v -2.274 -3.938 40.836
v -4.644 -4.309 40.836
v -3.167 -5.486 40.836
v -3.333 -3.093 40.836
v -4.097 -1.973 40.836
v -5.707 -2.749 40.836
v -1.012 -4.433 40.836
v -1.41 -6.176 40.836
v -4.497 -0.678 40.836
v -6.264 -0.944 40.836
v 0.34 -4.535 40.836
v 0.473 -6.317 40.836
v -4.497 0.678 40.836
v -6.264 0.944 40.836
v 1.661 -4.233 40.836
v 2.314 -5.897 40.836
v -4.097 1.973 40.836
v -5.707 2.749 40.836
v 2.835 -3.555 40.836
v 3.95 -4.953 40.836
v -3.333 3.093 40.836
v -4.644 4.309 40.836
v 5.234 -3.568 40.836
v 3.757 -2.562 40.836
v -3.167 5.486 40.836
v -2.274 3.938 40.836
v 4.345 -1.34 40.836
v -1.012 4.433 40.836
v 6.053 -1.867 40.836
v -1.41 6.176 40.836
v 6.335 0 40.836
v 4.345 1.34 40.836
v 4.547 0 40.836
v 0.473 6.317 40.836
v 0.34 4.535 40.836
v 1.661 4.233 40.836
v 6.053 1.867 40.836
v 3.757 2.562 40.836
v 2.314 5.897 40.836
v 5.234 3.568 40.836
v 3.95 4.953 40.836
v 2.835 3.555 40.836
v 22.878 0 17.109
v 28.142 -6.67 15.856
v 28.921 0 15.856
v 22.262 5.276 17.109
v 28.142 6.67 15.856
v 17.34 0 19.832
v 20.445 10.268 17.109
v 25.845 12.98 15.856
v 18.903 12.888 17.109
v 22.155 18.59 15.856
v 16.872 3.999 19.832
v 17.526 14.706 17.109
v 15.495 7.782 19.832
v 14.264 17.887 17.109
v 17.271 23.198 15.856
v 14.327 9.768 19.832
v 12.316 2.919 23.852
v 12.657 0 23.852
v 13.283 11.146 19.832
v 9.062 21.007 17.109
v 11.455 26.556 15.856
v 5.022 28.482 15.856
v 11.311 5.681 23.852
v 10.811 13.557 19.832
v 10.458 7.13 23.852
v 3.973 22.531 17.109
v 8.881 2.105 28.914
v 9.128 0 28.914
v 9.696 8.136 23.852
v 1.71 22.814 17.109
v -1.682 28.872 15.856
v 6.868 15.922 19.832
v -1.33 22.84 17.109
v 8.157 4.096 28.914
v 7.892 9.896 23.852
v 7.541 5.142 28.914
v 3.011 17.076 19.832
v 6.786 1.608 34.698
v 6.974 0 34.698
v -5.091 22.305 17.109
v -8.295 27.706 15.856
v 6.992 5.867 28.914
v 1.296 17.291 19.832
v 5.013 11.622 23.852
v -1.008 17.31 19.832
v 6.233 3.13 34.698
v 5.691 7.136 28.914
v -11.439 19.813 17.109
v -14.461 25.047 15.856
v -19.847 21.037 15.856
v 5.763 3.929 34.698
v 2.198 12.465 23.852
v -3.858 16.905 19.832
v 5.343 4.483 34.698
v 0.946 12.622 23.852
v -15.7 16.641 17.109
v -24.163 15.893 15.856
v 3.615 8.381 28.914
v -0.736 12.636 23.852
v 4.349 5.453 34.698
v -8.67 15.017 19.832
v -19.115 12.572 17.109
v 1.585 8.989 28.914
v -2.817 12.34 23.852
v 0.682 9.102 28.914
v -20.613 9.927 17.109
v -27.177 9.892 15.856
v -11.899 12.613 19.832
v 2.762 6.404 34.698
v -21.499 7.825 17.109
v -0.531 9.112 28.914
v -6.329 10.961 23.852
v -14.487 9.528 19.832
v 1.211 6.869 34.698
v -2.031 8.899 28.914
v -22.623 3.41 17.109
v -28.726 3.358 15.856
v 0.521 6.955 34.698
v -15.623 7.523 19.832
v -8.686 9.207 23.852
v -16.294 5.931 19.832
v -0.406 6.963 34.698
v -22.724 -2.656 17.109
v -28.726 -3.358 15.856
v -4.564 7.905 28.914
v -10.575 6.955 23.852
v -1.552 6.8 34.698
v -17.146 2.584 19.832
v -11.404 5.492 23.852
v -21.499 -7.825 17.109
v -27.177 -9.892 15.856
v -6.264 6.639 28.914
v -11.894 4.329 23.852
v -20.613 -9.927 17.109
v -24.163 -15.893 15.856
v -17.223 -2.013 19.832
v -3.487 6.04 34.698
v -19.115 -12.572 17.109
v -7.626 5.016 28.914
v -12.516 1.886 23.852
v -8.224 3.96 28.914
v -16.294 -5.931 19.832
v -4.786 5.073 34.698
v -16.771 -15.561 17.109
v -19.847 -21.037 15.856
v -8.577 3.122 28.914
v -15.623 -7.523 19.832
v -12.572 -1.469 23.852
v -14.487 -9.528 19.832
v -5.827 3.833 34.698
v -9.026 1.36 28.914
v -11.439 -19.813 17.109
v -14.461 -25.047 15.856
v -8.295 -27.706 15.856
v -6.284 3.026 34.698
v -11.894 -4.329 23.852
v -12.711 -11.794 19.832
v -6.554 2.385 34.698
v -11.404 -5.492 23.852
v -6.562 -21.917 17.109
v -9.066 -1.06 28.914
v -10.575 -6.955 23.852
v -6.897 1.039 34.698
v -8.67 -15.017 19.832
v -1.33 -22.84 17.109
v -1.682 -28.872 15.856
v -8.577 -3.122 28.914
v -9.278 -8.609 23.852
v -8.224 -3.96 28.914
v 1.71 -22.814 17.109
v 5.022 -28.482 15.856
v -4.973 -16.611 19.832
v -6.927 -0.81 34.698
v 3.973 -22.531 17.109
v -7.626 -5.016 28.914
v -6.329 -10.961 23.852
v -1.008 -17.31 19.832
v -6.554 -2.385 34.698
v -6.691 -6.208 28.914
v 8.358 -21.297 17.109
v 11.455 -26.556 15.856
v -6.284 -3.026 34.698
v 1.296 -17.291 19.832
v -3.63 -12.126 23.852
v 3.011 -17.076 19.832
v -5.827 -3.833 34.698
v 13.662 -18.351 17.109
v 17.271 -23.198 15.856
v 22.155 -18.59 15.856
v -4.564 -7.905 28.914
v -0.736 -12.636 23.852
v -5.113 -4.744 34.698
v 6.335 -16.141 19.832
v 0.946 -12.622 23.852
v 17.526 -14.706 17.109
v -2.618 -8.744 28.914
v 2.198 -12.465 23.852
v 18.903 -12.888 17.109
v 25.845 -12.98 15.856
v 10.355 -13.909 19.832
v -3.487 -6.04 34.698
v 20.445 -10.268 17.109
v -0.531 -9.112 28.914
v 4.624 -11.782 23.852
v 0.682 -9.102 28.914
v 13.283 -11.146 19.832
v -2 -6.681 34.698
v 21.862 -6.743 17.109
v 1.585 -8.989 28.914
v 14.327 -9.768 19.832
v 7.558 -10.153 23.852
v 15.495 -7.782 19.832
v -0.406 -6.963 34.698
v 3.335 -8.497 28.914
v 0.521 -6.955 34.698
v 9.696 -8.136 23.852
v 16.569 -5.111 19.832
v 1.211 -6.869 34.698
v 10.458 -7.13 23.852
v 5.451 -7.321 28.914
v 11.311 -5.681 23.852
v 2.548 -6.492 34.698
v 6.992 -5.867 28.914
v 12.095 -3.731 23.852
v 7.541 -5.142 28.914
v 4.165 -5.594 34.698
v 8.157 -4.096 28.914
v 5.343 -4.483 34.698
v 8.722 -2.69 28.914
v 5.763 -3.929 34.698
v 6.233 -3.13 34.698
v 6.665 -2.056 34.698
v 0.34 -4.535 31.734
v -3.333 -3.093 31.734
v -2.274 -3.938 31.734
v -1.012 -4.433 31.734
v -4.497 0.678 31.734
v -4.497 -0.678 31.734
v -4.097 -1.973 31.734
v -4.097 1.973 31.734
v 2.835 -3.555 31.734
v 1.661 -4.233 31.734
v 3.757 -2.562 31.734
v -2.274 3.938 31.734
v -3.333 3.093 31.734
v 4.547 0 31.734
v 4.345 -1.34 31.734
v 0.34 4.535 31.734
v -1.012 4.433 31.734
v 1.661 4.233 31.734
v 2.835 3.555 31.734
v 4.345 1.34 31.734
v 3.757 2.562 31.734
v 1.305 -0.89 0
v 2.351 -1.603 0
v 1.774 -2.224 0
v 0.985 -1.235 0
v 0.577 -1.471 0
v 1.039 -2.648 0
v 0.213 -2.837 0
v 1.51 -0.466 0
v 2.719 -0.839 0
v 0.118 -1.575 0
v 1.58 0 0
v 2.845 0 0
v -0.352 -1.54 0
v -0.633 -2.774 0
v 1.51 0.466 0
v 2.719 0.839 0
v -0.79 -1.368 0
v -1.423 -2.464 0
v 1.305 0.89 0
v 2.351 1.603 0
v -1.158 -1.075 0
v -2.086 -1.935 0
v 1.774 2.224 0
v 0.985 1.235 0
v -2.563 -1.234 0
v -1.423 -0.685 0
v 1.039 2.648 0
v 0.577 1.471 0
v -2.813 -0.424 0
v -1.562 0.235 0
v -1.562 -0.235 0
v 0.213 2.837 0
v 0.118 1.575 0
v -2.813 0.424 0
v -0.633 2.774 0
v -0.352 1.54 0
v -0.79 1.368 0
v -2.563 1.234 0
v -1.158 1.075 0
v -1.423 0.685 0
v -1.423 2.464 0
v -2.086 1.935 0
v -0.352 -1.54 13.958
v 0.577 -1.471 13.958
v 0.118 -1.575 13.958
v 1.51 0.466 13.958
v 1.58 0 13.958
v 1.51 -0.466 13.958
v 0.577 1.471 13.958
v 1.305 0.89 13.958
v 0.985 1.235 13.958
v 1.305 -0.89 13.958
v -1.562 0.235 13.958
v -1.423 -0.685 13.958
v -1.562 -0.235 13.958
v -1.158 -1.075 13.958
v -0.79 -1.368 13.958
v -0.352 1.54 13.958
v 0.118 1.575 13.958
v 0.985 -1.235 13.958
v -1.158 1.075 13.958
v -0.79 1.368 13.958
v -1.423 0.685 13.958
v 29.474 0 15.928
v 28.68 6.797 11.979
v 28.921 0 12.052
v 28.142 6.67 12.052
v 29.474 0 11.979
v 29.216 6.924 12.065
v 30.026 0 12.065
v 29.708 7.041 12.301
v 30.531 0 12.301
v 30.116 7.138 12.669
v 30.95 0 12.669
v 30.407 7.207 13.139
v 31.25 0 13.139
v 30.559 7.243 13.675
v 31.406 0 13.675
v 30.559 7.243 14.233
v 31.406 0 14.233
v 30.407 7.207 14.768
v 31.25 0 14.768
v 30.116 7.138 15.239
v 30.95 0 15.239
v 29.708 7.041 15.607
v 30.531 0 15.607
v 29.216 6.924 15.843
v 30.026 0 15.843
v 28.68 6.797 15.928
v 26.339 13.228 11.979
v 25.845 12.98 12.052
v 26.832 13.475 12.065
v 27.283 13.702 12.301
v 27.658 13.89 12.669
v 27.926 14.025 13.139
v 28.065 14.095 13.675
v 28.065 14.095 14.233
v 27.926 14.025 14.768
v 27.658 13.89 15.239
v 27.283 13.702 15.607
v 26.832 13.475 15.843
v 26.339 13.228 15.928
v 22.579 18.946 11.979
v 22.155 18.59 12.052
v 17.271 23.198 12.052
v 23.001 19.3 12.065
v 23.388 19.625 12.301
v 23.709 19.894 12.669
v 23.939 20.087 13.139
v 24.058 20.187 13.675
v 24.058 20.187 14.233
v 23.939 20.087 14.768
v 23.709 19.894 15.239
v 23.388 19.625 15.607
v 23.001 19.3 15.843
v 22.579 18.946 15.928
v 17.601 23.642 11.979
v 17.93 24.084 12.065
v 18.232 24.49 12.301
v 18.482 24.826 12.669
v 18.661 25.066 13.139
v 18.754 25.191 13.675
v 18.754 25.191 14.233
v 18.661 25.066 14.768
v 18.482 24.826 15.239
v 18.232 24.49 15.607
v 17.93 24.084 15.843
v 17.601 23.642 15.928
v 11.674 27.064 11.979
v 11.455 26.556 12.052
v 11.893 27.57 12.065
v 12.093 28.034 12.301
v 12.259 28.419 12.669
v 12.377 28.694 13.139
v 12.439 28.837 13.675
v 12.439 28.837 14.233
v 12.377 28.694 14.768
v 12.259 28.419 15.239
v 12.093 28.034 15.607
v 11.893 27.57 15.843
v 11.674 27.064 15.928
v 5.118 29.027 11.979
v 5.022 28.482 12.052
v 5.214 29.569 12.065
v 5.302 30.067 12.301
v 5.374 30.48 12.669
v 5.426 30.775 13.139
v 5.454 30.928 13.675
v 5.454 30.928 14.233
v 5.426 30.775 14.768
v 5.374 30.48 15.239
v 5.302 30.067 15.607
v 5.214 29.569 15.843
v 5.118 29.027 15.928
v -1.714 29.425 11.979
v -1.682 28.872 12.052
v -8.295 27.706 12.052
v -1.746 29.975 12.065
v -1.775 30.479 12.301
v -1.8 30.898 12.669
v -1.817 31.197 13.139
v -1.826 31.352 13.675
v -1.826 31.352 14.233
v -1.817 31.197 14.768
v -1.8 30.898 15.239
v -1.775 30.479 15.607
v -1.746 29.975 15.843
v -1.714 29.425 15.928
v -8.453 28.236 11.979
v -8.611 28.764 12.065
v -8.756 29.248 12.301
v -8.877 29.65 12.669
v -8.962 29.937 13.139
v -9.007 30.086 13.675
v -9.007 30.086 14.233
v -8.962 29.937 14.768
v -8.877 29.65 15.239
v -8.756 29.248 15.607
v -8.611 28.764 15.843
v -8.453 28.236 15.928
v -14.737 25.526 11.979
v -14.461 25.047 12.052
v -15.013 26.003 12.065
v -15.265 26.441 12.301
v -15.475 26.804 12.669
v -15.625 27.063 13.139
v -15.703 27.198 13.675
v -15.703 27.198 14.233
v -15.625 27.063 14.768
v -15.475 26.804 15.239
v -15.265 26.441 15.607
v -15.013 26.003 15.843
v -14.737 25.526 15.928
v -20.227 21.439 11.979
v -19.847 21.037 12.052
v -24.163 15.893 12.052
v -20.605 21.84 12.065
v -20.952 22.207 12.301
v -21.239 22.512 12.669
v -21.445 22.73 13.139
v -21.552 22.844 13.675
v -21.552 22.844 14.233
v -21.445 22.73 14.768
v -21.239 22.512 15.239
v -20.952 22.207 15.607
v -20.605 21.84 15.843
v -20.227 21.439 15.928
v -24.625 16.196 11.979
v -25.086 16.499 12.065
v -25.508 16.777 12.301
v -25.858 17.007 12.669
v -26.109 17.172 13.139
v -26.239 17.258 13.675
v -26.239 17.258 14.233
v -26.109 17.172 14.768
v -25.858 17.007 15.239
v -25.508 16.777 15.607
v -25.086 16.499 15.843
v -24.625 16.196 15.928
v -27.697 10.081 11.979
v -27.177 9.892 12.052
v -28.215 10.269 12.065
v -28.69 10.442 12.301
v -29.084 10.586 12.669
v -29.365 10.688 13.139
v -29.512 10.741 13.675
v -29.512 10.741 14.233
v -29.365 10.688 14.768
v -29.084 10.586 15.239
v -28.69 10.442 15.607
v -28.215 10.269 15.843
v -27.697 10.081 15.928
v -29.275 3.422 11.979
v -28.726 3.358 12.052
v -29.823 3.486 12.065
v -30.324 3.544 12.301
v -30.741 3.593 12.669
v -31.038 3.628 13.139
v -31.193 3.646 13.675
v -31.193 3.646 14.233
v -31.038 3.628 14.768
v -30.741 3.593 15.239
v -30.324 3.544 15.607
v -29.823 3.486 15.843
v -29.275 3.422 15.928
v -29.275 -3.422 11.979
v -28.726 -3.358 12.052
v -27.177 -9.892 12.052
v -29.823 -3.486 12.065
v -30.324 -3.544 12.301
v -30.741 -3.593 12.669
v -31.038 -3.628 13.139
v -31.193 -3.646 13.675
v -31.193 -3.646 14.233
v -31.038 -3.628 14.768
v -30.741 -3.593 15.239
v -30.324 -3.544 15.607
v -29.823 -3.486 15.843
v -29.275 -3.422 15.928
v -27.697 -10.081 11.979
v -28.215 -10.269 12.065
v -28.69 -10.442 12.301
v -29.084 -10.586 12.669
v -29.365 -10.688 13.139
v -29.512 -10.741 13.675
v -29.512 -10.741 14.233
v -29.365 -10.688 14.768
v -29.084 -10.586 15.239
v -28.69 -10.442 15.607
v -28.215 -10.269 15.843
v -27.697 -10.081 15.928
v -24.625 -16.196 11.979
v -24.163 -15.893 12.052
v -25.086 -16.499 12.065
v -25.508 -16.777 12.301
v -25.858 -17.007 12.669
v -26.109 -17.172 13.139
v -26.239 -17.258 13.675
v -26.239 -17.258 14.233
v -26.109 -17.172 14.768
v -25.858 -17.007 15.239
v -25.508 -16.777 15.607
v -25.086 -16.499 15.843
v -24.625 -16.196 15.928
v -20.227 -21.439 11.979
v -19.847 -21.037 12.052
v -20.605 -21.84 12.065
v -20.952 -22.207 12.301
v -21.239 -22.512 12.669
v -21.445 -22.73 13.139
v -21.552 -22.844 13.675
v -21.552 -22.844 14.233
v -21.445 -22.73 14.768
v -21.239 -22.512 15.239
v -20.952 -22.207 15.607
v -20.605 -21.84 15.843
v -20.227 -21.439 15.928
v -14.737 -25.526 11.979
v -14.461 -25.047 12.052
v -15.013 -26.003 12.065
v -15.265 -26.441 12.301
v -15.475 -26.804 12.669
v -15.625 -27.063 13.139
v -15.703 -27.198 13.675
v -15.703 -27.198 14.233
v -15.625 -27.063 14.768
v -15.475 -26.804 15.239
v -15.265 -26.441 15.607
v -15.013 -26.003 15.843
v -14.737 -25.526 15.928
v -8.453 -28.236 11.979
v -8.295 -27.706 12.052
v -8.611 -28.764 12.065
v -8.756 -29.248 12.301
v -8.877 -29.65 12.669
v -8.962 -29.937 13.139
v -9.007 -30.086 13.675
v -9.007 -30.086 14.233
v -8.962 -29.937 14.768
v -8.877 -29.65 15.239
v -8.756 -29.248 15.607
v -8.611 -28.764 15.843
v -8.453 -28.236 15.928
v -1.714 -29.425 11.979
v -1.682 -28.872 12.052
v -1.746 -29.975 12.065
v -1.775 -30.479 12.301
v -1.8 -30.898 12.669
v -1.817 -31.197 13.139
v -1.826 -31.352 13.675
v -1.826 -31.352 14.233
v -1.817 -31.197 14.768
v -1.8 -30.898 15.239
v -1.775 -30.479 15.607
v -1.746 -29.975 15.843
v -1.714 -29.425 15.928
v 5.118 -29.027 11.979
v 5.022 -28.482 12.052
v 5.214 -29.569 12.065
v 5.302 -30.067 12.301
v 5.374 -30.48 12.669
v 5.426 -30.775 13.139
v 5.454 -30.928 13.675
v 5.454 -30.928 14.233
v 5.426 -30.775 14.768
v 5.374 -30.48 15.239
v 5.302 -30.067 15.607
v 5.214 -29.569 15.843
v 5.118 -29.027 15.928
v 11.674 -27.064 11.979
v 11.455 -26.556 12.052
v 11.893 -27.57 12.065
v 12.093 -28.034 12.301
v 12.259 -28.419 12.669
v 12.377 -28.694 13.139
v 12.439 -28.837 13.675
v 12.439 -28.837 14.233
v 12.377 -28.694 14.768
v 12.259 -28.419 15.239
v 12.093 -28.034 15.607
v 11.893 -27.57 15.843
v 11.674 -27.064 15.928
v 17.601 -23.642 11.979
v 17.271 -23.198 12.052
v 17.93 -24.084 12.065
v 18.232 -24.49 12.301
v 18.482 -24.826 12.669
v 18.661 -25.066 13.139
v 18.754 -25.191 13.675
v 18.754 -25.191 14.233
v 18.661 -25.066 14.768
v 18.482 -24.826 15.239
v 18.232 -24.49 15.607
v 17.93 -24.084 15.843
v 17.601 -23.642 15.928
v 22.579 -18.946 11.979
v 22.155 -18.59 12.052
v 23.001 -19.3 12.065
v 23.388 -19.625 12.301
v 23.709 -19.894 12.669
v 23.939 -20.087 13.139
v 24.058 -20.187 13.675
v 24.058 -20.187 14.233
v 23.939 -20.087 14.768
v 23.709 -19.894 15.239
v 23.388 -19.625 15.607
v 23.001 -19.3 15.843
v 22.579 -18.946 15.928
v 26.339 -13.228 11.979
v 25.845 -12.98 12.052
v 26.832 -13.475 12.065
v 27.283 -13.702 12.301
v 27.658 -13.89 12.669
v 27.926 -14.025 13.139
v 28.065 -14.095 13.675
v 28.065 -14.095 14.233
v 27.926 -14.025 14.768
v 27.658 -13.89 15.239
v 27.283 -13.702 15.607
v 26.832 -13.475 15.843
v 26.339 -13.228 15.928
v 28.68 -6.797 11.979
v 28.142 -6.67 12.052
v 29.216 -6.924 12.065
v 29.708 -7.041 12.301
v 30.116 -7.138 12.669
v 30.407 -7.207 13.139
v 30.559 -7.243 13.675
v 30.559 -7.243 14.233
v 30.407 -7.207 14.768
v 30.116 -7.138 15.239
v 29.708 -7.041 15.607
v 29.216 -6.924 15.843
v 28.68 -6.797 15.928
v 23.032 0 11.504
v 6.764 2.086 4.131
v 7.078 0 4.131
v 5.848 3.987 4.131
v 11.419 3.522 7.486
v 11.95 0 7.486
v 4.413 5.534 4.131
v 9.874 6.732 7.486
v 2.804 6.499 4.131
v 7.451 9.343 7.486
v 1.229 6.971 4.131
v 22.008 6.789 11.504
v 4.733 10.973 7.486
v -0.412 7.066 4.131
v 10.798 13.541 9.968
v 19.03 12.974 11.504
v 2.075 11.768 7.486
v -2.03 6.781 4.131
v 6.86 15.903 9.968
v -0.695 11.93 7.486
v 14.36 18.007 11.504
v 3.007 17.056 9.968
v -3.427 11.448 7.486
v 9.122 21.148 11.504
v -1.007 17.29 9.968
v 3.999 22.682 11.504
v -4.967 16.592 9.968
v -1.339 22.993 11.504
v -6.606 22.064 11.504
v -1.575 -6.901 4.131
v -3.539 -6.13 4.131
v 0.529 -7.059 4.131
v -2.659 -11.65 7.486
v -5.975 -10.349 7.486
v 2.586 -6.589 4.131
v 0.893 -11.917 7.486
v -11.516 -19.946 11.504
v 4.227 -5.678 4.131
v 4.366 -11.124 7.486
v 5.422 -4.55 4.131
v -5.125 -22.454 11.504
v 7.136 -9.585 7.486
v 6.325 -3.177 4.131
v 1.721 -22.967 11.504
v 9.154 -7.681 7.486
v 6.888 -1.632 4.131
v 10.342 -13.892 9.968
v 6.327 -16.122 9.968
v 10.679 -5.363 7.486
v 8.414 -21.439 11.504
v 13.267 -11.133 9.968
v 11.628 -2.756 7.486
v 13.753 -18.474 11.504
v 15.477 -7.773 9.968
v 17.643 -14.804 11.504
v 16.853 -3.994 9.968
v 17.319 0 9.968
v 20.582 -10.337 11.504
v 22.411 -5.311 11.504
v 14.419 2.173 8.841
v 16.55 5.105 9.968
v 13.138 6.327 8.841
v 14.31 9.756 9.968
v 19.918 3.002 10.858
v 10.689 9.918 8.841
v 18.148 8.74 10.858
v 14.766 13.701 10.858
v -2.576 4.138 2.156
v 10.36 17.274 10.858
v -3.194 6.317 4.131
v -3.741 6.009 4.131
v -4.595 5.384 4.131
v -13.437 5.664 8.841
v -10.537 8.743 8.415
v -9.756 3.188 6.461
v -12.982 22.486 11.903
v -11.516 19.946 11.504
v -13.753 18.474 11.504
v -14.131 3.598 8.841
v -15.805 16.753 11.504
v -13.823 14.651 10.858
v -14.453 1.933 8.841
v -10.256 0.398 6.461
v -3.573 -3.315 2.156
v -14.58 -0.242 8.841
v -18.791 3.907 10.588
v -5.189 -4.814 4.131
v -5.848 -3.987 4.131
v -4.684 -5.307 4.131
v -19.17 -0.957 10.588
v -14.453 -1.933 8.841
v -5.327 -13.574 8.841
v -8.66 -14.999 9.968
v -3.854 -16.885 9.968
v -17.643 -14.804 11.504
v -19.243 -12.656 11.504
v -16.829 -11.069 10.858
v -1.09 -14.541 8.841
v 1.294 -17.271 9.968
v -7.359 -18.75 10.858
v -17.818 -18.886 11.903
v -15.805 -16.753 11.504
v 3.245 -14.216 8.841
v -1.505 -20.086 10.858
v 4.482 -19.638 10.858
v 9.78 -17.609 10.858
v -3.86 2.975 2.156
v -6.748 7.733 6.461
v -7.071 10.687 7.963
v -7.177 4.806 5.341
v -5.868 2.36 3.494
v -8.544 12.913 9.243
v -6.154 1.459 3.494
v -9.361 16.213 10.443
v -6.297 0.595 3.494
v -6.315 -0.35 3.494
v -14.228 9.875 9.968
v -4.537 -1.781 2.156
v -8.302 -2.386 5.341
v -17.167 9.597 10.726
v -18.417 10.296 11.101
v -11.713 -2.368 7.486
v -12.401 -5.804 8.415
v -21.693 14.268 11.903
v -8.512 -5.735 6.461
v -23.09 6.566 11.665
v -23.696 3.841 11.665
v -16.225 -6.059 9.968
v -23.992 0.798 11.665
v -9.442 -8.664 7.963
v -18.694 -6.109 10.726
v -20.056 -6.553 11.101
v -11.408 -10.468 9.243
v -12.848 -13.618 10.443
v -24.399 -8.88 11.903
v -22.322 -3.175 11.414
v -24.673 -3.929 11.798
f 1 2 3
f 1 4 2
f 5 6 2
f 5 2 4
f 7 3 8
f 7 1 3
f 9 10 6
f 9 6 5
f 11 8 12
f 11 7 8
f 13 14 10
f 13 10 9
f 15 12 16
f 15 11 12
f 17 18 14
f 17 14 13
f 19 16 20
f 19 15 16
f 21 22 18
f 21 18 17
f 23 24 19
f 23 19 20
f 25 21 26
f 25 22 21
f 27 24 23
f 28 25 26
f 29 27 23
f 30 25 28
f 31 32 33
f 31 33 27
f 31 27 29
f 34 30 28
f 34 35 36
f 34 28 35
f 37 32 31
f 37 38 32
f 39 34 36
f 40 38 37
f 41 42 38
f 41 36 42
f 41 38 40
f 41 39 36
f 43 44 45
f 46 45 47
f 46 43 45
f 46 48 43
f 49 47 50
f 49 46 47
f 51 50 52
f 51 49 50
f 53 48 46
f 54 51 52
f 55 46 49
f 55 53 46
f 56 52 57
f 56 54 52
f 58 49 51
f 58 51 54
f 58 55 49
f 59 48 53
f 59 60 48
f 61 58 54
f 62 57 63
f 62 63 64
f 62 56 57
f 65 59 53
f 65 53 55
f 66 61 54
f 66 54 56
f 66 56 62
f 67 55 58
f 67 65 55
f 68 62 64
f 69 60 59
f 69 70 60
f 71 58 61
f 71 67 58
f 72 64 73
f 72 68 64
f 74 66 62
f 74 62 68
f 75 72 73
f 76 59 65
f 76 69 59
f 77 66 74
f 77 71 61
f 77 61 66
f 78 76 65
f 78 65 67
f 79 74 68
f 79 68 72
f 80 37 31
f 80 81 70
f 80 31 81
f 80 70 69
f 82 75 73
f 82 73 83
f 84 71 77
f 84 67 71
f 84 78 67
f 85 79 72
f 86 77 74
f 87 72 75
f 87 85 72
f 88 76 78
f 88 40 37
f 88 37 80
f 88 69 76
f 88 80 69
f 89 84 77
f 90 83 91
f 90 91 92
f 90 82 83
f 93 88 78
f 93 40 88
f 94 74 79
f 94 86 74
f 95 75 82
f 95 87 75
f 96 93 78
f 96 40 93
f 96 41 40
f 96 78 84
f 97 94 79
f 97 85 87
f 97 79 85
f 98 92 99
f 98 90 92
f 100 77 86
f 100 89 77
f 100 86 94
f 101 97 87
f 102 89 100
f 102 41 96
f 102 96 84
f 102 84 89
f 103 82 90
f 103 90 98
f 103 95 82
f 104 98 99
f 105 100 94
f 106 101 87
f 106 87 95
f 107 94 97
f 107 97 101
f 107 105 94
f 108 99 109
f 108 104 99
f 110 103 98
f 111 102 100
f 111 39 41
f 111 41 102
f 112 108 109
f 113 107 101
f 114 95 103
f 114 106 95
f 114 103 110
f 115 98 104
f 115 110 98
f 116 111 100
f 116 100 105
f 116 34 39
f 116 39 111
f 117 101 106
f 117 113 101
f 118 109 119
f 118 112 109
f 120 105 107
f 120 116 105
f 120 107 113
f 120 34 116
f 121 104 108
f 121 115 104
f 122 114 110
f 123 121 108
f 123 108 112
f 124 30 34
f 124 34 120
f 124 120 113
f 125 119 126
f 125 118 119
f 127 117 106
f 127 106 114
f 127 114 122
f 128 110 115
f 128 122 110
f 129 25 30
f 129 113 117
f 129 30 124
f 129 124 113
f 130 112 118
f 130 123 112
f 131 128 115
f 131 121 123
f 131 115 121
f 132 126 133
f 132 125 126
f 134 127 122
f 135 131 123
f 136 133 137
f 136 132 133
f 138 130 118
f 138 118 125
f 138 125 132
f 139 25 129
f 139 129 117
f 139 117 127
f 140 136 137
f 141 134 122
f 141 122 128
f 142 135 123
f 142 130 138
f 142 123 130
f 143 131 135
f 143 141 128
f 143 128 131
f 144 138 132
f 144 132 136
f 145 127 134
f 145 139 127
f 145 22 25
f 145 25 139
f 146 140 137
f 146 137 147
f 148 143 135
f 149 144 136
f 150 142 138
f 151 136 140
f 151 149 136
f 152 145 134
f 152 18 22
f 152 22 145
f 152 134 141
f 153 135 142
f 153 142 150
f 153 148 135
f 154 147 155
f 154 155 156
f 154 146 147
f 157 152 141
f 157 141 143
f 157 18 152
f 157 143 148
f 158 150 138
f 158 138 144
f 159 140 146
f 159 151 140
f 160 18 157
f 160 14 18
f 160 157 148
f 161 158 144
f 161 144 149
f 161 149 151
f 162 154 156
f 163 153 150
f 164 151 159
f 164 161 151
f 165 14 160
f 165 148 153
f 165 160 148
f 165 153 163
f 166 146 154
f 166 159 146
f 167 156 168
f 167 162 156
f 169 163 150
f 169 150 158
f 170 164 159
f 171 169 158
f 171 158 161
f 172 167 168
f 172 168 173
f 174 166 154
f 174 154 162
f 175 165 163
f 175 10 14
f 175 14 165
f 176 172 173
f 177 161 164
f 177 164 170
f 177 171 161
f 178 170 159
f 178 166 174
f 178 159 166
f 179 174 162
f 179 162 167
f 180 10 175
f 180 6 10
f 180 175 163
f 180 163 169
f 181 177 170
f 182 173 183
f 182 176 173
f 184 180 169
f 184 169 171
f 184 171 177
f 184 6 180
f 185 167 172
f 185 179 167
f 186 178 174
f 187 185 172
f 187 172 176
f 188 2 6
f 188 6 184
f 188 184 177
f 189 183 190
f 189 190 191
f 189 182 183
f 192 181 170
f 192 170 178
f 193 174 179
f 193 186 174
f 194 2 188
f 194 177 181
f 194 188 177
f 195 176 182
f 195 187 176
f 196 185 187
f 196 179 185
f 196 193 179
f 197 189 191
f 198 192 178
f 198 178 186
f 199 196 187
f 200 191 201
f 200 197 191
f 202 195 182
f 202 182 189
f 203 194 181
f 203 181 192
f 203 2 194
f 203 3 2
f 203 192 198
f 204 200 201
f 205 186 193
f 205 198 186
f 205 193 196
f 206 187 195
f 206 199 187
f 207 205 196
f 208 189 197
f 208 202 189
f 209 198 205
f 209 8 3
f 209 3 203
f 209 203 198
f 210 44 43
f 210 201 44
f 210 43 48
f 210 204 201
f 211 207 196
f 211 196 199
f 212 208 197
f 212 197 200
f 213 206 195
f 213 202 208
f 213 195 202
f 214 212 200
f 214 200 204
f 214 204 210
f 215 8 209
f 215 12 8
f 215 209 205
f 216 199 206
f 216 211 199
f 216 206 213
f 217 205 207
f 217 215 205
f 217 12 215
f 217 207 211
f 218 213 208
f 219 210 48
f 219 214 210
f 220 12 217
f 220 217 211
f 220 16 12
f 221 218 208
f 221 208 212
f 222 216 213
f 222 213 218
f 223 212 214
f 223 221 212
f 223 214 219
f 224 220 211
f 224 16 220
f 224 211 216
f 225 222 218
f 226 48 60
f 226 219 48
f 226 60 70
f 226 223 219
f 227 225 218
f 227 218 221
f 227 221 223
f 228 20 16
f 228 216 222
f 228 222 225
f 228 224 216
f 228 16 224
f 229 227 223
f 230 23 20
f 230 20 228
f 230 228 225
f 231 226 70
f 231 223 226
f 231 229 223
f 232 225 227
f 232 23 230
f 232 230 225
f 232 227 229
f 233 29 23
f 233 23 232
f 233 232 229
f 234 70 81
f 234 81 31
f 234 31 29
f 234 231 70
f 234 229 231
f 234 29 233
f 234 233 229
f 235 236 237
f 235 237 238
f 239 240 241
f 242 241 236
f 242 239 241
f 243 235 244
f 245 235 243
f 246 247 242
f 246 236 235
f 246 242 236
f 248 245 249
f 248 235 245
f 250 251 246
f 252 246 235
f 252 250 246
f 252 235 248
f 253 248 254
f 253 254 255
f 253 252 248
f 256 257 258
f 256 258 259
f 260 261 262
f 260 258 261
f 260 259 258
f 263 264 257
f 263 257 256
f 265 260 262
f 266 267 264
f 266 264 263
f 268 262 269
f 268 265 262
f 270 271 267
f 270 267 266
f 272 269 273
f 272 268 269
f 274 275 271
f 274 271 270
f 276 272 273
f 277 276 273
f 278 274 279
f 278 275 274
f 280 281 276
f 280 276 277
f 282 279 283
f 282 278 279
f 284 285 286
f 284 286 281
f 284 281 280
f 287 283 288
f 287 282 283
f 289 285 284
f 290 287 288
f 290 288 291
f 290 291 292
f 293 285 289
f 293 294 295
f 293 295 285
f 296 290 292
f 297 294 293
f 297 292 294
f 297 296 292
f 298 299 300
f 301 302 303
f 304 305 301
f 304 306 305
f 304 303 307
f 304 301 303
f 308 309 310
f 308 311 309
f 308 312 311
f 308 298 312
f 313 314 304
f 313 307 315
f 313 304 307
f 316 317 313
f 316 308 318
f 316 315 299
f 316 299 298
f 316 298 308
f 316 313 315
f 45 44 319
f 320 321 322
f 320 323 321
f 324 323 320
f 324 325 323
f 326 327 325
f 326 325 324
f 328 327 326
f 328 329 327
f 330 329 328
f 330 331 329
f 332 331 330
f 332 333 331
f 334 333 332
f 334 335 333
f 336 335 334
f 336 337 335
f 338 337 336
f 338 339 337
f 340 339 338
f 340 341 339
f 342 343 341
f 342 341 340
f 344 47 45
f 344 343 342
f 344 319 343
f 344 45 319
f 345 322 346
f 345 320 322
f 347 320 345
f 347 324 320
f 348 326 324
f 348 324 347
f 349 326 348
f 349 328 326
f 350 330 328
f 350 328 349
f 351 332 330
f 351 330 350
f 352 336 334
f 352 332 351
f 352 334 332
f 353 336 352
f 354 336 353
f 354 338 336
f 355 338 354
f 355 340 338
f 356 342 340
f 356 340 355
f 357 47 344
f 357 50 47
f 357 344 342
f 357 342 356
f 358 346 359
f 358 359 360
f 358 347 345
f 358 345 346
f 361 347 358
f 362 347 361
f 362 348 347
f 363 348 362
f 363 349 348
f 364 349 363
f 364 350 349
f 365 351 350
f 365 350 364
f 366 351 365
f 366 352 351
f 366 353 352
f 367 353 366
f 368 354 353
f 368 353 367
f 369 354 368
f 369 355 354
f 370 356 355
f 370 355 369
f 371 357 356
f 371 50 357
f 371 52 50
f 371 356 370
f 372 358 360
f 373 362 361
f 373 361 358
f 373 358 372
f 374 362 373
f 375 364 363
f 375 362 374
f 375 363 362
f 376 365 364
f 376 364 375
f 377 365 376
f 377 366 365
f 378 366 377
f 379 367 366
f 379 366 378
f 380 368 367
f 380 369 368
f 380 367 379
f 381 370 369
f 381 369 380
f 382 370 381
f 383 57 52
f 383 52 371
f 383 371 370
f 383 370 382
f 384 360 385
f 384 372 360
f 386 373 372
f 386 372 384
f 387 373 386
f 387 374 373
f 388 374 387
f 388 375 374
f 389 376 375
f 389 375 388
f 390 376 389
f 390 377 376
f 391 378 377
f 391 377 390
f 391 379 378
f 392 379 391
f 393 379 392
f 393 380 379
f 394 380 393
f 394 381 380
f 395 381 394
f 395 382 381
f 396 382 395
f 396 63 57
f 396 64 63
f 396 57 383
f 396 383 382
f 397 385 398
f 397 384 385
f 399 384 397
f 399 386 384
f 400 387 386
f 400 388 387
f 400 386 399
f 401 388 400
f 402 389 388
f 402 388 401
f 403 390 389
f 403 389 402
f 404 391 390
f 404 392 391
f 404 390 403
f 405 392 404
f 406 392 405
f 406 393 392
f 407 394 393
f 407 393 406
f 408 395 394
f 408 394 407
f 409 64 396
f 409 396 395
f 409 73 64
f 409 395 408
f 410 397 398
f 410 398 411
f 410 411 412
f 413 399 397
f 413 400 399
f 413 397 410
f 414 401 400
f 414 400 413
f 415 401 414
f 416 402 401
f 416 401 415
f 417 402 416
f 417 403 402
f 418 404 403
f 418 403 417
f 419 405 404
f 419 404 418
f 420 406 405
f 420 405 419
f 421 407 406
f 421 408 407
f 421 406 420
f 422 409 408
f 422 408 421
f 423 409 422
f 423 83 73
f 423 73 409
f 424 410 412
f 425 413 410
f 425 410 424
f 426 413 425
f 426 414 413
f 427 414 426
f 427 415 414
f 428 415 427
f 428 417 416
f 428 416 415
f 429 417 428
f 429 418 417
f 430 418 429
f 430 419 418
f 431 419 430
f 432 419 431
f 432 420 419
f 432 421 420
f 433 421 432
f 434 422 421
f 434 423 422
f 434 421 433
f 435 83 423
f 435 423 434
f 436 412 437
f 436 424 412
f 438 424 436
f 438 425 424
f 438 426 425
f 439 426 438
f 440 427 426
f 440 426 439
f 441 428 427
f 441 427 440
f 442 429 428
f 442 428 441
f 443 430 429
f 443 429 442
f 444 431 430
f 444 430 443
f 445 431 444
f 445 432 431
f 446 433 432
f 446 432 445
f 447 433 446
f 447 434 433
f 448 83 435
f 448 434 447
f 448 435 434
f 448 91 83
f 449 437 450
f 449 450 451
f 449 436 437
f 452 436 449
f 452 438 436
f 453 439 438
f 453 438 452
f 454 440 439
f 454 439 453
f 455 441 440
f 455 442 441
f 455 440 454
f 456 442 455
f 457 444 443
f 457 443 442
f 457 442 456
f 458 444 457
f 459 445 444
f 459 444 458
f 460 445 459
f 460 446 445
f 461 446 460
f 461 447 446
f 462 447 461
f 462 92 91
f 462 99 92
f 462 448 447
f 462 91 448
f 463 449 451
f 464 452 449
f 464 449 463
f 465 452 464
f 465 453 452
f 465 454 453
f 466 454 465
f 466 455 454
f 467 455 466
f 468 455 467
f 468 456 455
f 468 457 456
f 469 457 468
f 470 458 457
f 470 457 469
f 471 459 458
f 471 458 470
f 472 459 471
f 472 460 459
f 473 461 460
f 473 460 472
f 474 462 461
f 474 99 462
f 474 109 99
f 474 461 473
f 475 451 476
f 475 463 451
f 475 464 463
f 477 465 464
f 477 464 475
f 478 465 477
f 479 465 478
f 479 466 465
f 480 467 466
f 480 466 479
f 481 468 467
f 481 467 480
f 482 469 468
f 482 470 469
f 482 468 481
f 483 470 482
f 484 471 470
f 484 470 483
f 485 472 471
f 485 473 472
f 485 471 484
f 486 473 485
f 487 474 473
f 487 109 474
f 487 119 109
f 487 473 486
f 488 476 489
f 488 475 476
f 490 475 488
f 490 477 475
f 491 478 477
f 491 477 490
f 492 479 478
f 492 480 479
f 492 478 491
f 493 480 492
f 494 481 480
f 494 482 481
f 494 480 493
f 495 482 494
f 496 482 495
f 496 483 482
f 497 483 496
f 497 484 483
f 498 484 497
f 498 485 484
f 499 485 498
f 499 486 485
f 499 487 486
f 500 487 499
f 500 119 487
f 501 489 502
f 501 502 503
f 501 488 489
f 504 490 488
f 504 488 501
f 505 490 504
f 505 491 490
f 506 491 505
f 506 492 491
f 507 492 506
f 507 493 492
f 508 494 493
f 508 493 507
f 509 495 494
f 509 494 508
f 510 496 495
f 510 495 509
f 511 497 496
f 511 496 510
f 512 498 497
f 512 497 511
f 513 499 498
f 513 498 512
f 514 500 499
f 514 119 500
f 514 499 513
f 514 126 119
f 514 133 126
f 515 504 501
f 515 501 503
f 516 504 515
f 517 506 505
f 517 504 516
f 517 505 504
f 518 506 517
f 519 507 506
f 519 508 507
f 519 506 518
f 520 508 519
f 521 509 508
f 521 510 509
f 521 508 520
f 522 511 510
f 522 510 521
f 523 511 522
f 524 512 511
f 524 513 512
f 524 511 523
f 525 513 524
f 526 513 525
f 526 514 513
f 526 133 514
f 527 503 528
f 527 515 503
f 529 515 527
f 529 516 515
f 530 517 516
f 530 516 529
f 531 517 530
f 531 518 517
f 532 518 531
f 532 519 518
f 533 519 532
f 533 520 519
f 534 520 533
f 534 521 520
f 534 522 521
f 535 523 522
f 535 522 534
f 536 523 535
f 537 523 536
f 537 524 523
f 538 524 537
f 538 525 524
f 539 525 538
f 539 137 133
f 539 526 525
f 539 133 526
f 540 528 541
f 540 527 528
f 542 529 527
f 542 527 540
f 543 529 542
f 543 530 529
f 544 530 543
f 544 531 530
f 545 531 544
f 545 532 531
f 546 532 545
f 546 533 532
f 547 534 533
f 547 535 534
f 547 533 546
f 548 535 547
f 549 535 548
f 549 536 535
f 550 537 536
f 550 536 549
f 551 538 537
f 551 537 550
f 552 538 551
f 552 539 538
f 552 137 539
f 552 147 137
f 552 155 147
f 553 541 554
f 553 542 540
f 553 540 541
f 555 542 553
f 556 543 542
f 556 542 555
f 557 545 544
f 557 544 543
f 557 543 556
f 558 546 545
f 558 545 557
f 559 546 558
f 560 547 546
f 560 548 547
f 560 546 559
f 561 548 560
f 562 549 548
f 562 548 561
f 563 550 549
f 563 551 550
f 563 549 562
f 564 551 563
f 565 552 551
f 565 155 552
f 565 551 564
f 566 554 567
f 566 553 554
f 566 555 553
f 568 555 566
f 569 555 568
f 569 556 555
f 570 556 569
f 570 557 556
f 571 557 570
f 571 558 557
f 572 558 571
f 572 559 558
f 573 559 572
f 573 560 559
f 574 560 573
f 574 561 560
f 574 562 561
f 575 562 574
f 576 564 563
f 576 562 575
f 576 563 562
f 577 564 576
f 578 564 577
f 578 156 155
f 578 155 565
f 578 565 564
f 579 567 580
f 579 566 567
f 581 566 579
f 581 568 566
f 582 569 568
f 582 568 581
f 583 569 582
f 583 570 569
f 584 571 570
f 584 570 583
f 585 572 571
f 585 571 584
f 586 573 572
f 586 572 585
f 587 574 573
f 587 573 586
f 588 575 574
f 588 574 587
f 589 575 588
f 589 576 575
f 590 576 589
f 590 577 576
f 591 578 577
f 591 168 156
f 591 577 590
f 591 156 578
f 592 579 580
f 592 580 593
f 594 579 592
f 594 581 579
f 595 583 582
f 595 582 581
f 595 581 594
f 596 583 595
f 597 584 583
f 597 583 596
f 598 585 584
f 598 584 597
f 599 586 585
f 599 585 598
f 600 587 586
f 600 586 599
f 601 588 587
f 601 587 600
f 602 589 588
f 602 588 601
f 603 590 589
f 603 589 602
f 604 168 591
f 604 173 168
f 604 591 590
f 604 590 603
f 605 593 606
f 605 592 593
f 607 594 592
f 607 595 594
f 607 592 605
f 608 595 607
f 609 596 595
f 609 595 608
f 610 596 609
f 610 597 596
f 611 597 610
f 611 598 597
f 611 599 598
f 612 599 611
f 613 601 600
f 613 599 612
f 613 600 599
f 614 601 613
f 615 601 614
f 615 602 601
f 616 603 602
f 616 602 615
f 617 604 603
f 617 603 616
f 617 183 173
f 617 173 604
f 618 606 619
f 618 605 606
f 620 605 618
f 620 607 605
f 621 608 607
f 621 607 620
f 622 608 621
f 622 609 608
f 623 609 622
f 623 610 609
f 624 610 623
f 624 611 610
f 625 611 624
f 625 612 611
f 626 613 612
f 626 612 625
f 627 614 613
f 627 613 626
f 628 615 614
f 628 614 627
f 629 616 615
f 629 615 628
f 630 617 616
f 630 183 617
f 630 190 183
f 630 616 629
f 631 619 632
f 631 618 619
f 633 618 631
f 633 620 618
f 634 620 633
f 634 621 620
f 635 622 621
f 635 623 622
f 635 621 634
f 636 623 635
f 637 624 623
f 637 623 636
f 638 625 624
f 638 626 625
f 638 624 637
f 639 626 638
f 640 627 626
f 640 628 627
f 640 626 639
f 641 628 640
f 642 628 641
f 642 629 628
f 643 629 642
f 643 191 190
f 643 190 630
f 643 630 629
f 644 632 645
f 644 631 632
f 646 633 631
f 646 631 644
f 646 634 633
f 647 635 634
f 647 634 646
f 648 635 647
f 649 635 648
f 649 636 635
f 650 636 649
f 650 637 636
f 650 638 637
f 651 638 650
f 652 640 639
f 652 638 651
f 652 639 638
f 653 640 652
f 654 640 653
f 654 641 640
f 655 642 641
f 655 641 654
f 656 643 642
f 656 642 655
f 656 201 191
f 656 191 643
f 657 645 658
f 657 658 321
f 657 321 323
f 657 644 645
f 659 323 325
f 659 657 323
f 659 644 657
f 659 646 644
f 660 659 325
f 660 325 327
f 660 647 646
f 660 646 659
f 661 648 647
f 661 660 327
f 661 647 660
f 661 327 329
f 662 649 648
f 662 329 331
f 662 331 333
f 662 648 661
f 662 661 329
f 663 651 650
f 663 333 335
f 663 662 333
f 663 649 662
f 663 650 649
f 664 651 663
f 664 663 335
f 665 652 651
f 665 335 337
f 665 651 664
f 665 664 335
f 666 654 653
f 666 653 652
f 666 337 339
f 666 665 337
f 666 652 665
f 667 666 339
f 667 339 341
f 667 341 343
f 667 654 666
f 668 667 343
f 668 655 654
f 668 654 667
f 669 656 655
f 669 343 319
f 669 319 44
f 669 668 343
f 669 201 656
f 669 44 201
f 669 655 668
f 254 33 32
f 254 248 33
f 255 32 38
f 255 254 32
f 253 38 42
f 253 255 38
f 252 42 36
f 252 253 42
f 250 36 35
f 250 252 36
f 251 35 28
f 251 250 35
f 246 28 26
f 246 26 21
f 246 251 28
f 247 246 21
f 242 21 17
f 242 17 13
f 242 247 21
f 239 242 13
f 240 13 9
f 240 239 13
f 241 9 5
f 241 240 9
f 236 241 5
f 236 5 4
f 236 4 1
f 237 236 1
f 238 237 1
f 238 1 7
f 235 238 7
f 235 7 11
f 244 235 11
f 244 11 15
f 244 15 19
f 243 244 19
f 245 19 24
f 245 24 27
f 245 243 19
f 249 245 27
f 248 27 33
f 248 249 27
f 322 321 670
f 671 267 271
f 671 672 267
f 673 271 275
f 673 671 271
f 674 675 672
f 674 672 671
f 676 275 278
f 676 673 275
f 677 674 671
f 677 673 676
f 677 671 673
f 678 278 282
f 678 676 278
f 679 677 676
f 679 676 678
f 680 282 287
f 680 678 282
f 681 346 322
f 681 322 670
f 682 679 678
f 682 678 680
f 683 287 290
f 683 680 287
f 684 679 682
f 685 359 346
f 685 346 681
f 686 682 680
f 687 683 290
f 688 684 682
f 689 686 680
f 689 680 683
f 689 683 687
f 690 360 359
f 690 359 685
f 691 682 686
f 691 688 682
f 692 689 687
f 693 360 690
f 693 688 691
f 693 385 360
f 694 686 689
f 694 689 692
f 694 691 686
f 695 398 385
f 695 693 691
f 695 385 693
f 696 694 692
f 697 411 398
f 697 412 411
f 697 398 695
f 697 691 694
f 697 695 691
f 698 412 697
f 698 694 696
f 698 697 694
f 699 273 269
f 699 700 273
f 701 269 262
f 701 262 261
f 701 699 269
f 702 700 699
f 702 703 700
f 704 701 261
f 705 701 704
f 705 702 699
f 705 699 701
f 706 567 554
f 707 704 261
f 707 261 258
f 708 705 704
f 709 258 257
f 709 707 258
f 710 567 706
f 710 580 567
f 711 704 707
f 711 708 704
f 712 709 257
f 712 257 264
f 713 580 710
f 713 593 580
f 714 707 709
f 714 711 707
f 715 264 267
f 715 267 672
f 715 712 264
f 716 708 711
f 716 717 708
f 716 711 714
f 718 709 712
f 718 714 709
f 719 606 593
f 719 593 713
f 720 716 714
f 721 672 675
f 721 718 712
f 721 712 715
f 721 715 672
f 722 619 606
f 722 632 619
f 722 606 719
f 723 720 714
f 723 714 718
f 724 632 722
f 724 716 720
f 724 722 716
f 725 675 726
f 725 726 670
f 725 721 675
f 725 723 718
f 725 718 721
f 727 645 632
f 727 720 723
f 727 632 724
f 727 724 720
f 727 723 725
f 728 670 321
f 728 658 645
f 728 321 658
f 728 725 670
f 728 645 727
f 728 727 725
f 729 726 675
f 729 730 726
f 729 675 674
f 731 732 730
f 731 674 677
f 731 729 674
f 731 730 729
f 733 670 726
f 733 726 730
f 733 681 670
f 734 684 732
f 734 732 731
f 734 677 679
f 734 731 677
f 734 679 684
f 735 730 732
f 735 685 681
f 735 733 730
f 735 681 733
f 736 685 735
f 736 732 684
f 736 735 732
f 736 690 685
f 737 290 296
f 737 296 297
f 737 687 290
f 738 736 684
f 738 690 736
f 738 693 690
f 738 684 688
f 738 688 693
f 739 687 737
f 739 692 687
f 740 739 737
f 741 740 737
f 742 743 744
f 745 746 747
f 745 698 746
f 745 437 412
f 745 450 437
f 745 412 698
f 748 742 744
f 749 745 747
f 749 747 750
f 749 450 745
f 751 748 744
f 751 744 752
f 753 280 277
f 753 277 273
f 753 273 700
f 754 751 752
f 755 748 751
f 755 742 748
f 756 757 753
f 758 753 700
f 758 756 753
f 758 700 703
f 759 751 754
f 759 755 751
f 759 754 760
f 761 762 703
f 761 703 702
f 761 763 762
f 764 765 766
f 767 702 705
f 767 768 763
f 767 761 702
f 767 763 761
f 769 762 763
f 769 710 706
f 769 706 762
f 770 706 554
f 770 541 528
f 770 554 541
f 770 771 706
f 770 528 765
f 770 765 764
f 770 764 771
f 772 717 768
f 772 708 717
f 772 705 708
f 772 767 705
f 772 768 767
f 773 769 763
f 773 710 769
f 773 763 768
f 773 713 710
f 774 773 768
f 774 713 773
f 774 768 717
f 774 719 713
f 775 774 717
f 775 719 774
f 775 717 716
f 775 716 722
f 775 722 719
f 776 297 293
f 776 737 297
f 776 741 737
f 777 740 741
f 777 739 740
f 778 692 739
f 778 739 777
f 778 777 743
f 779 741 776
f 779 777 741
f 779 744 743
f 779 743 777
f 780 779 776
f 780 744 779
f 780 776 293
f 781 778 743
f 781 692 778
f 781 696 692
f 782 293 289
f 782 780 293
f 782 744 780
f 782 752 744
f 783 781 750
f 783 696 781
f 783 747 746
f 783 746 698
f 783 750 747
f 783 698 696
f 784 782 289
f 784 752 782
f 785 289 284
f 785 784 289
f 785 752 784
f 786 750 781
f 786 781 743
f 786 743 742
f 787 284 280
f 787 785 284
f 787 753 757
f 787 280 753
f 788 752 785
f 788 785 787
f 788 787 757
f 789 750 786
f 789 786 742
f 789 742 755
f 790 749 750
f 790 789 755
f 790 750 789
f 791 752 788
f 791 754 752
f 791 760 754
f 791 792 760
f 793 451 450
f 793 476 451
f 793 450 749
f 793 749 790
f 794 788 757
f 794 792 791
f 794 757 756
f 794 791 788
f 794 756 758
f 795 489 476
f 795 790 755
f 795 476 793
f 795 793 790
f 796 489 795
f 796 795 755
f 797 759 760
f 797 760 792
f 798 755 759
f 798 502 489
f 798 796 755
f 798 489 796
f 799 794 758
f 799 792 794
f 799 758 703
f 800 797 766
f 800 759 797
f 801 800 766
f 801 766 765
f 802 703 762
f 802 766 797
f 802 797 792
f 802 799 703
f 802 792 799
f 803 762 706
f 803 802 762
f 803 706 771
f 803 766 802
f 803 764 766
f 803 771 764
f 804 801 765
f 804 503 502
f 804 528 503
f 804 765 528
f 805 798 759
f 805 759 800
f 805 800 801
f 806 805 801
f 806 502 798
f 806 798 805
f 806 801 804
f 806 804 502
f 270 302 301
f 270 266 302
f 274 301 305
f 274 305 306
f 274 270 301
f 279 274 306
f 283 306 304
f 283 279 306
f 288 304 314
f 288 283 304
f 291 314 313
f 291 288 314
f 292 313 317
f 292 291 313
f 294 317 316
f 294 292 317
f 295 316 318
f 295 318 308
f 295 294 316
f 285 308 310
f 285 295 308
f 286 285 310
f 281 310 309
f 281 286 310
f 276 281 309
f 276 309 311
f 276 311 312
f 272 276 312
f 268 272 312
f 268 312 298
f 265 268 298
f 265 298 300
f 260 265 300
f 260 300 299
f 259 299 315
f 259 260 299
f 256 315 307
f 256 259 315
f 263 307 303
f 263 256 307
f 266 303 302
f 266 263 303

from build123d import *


# Not quite as in the source:
# - a feature names something its author has since deleted; it is built from what else it names


with BuildPart() as f1:
    # F0 (on Front) → F1 (revolve)
    with BuildSketch(Plane.XZ):
        with BuildLine():
            Line((1.579833799, 13.9581533149), (1.579833799, 0))
            Line((1.579833799, 0), (2.8451390099, 0))
            ThreePointArc((2.8451390099, 0), (14.581897199, 8.8414692128), (28.9212949574, 12.0515692979))
            ThreePointArc((28.9212949574, 12.0515692979), (31.4253055765, 13.9538953081), (28.9212949574, 15.8562213182))
            ThreePointArc((28.9212949574, 15.8562213182), (12.6572464777, 23.8517040301), (6.334674079, 40.8361703157))
            Line((6.334674079, 40.8361703157), (4.5473091304, 40.8361703157))
            Line((4.5473091304, 40.8361703157), (4.5473091304, 31.7337363958))
            Line((4.5473091304, 31.7337363958), (0, 31.7337363958))
            Line((0, 31.7337363958), (0, 13.9581533149))
            Line((0, 13.9581533149), (1.579833799, 13.9581533149))
        make_face()
    revolve(axis=Axis((0, 0, 22.8459448554), (0, 0, 1)))


solid = f1.part
